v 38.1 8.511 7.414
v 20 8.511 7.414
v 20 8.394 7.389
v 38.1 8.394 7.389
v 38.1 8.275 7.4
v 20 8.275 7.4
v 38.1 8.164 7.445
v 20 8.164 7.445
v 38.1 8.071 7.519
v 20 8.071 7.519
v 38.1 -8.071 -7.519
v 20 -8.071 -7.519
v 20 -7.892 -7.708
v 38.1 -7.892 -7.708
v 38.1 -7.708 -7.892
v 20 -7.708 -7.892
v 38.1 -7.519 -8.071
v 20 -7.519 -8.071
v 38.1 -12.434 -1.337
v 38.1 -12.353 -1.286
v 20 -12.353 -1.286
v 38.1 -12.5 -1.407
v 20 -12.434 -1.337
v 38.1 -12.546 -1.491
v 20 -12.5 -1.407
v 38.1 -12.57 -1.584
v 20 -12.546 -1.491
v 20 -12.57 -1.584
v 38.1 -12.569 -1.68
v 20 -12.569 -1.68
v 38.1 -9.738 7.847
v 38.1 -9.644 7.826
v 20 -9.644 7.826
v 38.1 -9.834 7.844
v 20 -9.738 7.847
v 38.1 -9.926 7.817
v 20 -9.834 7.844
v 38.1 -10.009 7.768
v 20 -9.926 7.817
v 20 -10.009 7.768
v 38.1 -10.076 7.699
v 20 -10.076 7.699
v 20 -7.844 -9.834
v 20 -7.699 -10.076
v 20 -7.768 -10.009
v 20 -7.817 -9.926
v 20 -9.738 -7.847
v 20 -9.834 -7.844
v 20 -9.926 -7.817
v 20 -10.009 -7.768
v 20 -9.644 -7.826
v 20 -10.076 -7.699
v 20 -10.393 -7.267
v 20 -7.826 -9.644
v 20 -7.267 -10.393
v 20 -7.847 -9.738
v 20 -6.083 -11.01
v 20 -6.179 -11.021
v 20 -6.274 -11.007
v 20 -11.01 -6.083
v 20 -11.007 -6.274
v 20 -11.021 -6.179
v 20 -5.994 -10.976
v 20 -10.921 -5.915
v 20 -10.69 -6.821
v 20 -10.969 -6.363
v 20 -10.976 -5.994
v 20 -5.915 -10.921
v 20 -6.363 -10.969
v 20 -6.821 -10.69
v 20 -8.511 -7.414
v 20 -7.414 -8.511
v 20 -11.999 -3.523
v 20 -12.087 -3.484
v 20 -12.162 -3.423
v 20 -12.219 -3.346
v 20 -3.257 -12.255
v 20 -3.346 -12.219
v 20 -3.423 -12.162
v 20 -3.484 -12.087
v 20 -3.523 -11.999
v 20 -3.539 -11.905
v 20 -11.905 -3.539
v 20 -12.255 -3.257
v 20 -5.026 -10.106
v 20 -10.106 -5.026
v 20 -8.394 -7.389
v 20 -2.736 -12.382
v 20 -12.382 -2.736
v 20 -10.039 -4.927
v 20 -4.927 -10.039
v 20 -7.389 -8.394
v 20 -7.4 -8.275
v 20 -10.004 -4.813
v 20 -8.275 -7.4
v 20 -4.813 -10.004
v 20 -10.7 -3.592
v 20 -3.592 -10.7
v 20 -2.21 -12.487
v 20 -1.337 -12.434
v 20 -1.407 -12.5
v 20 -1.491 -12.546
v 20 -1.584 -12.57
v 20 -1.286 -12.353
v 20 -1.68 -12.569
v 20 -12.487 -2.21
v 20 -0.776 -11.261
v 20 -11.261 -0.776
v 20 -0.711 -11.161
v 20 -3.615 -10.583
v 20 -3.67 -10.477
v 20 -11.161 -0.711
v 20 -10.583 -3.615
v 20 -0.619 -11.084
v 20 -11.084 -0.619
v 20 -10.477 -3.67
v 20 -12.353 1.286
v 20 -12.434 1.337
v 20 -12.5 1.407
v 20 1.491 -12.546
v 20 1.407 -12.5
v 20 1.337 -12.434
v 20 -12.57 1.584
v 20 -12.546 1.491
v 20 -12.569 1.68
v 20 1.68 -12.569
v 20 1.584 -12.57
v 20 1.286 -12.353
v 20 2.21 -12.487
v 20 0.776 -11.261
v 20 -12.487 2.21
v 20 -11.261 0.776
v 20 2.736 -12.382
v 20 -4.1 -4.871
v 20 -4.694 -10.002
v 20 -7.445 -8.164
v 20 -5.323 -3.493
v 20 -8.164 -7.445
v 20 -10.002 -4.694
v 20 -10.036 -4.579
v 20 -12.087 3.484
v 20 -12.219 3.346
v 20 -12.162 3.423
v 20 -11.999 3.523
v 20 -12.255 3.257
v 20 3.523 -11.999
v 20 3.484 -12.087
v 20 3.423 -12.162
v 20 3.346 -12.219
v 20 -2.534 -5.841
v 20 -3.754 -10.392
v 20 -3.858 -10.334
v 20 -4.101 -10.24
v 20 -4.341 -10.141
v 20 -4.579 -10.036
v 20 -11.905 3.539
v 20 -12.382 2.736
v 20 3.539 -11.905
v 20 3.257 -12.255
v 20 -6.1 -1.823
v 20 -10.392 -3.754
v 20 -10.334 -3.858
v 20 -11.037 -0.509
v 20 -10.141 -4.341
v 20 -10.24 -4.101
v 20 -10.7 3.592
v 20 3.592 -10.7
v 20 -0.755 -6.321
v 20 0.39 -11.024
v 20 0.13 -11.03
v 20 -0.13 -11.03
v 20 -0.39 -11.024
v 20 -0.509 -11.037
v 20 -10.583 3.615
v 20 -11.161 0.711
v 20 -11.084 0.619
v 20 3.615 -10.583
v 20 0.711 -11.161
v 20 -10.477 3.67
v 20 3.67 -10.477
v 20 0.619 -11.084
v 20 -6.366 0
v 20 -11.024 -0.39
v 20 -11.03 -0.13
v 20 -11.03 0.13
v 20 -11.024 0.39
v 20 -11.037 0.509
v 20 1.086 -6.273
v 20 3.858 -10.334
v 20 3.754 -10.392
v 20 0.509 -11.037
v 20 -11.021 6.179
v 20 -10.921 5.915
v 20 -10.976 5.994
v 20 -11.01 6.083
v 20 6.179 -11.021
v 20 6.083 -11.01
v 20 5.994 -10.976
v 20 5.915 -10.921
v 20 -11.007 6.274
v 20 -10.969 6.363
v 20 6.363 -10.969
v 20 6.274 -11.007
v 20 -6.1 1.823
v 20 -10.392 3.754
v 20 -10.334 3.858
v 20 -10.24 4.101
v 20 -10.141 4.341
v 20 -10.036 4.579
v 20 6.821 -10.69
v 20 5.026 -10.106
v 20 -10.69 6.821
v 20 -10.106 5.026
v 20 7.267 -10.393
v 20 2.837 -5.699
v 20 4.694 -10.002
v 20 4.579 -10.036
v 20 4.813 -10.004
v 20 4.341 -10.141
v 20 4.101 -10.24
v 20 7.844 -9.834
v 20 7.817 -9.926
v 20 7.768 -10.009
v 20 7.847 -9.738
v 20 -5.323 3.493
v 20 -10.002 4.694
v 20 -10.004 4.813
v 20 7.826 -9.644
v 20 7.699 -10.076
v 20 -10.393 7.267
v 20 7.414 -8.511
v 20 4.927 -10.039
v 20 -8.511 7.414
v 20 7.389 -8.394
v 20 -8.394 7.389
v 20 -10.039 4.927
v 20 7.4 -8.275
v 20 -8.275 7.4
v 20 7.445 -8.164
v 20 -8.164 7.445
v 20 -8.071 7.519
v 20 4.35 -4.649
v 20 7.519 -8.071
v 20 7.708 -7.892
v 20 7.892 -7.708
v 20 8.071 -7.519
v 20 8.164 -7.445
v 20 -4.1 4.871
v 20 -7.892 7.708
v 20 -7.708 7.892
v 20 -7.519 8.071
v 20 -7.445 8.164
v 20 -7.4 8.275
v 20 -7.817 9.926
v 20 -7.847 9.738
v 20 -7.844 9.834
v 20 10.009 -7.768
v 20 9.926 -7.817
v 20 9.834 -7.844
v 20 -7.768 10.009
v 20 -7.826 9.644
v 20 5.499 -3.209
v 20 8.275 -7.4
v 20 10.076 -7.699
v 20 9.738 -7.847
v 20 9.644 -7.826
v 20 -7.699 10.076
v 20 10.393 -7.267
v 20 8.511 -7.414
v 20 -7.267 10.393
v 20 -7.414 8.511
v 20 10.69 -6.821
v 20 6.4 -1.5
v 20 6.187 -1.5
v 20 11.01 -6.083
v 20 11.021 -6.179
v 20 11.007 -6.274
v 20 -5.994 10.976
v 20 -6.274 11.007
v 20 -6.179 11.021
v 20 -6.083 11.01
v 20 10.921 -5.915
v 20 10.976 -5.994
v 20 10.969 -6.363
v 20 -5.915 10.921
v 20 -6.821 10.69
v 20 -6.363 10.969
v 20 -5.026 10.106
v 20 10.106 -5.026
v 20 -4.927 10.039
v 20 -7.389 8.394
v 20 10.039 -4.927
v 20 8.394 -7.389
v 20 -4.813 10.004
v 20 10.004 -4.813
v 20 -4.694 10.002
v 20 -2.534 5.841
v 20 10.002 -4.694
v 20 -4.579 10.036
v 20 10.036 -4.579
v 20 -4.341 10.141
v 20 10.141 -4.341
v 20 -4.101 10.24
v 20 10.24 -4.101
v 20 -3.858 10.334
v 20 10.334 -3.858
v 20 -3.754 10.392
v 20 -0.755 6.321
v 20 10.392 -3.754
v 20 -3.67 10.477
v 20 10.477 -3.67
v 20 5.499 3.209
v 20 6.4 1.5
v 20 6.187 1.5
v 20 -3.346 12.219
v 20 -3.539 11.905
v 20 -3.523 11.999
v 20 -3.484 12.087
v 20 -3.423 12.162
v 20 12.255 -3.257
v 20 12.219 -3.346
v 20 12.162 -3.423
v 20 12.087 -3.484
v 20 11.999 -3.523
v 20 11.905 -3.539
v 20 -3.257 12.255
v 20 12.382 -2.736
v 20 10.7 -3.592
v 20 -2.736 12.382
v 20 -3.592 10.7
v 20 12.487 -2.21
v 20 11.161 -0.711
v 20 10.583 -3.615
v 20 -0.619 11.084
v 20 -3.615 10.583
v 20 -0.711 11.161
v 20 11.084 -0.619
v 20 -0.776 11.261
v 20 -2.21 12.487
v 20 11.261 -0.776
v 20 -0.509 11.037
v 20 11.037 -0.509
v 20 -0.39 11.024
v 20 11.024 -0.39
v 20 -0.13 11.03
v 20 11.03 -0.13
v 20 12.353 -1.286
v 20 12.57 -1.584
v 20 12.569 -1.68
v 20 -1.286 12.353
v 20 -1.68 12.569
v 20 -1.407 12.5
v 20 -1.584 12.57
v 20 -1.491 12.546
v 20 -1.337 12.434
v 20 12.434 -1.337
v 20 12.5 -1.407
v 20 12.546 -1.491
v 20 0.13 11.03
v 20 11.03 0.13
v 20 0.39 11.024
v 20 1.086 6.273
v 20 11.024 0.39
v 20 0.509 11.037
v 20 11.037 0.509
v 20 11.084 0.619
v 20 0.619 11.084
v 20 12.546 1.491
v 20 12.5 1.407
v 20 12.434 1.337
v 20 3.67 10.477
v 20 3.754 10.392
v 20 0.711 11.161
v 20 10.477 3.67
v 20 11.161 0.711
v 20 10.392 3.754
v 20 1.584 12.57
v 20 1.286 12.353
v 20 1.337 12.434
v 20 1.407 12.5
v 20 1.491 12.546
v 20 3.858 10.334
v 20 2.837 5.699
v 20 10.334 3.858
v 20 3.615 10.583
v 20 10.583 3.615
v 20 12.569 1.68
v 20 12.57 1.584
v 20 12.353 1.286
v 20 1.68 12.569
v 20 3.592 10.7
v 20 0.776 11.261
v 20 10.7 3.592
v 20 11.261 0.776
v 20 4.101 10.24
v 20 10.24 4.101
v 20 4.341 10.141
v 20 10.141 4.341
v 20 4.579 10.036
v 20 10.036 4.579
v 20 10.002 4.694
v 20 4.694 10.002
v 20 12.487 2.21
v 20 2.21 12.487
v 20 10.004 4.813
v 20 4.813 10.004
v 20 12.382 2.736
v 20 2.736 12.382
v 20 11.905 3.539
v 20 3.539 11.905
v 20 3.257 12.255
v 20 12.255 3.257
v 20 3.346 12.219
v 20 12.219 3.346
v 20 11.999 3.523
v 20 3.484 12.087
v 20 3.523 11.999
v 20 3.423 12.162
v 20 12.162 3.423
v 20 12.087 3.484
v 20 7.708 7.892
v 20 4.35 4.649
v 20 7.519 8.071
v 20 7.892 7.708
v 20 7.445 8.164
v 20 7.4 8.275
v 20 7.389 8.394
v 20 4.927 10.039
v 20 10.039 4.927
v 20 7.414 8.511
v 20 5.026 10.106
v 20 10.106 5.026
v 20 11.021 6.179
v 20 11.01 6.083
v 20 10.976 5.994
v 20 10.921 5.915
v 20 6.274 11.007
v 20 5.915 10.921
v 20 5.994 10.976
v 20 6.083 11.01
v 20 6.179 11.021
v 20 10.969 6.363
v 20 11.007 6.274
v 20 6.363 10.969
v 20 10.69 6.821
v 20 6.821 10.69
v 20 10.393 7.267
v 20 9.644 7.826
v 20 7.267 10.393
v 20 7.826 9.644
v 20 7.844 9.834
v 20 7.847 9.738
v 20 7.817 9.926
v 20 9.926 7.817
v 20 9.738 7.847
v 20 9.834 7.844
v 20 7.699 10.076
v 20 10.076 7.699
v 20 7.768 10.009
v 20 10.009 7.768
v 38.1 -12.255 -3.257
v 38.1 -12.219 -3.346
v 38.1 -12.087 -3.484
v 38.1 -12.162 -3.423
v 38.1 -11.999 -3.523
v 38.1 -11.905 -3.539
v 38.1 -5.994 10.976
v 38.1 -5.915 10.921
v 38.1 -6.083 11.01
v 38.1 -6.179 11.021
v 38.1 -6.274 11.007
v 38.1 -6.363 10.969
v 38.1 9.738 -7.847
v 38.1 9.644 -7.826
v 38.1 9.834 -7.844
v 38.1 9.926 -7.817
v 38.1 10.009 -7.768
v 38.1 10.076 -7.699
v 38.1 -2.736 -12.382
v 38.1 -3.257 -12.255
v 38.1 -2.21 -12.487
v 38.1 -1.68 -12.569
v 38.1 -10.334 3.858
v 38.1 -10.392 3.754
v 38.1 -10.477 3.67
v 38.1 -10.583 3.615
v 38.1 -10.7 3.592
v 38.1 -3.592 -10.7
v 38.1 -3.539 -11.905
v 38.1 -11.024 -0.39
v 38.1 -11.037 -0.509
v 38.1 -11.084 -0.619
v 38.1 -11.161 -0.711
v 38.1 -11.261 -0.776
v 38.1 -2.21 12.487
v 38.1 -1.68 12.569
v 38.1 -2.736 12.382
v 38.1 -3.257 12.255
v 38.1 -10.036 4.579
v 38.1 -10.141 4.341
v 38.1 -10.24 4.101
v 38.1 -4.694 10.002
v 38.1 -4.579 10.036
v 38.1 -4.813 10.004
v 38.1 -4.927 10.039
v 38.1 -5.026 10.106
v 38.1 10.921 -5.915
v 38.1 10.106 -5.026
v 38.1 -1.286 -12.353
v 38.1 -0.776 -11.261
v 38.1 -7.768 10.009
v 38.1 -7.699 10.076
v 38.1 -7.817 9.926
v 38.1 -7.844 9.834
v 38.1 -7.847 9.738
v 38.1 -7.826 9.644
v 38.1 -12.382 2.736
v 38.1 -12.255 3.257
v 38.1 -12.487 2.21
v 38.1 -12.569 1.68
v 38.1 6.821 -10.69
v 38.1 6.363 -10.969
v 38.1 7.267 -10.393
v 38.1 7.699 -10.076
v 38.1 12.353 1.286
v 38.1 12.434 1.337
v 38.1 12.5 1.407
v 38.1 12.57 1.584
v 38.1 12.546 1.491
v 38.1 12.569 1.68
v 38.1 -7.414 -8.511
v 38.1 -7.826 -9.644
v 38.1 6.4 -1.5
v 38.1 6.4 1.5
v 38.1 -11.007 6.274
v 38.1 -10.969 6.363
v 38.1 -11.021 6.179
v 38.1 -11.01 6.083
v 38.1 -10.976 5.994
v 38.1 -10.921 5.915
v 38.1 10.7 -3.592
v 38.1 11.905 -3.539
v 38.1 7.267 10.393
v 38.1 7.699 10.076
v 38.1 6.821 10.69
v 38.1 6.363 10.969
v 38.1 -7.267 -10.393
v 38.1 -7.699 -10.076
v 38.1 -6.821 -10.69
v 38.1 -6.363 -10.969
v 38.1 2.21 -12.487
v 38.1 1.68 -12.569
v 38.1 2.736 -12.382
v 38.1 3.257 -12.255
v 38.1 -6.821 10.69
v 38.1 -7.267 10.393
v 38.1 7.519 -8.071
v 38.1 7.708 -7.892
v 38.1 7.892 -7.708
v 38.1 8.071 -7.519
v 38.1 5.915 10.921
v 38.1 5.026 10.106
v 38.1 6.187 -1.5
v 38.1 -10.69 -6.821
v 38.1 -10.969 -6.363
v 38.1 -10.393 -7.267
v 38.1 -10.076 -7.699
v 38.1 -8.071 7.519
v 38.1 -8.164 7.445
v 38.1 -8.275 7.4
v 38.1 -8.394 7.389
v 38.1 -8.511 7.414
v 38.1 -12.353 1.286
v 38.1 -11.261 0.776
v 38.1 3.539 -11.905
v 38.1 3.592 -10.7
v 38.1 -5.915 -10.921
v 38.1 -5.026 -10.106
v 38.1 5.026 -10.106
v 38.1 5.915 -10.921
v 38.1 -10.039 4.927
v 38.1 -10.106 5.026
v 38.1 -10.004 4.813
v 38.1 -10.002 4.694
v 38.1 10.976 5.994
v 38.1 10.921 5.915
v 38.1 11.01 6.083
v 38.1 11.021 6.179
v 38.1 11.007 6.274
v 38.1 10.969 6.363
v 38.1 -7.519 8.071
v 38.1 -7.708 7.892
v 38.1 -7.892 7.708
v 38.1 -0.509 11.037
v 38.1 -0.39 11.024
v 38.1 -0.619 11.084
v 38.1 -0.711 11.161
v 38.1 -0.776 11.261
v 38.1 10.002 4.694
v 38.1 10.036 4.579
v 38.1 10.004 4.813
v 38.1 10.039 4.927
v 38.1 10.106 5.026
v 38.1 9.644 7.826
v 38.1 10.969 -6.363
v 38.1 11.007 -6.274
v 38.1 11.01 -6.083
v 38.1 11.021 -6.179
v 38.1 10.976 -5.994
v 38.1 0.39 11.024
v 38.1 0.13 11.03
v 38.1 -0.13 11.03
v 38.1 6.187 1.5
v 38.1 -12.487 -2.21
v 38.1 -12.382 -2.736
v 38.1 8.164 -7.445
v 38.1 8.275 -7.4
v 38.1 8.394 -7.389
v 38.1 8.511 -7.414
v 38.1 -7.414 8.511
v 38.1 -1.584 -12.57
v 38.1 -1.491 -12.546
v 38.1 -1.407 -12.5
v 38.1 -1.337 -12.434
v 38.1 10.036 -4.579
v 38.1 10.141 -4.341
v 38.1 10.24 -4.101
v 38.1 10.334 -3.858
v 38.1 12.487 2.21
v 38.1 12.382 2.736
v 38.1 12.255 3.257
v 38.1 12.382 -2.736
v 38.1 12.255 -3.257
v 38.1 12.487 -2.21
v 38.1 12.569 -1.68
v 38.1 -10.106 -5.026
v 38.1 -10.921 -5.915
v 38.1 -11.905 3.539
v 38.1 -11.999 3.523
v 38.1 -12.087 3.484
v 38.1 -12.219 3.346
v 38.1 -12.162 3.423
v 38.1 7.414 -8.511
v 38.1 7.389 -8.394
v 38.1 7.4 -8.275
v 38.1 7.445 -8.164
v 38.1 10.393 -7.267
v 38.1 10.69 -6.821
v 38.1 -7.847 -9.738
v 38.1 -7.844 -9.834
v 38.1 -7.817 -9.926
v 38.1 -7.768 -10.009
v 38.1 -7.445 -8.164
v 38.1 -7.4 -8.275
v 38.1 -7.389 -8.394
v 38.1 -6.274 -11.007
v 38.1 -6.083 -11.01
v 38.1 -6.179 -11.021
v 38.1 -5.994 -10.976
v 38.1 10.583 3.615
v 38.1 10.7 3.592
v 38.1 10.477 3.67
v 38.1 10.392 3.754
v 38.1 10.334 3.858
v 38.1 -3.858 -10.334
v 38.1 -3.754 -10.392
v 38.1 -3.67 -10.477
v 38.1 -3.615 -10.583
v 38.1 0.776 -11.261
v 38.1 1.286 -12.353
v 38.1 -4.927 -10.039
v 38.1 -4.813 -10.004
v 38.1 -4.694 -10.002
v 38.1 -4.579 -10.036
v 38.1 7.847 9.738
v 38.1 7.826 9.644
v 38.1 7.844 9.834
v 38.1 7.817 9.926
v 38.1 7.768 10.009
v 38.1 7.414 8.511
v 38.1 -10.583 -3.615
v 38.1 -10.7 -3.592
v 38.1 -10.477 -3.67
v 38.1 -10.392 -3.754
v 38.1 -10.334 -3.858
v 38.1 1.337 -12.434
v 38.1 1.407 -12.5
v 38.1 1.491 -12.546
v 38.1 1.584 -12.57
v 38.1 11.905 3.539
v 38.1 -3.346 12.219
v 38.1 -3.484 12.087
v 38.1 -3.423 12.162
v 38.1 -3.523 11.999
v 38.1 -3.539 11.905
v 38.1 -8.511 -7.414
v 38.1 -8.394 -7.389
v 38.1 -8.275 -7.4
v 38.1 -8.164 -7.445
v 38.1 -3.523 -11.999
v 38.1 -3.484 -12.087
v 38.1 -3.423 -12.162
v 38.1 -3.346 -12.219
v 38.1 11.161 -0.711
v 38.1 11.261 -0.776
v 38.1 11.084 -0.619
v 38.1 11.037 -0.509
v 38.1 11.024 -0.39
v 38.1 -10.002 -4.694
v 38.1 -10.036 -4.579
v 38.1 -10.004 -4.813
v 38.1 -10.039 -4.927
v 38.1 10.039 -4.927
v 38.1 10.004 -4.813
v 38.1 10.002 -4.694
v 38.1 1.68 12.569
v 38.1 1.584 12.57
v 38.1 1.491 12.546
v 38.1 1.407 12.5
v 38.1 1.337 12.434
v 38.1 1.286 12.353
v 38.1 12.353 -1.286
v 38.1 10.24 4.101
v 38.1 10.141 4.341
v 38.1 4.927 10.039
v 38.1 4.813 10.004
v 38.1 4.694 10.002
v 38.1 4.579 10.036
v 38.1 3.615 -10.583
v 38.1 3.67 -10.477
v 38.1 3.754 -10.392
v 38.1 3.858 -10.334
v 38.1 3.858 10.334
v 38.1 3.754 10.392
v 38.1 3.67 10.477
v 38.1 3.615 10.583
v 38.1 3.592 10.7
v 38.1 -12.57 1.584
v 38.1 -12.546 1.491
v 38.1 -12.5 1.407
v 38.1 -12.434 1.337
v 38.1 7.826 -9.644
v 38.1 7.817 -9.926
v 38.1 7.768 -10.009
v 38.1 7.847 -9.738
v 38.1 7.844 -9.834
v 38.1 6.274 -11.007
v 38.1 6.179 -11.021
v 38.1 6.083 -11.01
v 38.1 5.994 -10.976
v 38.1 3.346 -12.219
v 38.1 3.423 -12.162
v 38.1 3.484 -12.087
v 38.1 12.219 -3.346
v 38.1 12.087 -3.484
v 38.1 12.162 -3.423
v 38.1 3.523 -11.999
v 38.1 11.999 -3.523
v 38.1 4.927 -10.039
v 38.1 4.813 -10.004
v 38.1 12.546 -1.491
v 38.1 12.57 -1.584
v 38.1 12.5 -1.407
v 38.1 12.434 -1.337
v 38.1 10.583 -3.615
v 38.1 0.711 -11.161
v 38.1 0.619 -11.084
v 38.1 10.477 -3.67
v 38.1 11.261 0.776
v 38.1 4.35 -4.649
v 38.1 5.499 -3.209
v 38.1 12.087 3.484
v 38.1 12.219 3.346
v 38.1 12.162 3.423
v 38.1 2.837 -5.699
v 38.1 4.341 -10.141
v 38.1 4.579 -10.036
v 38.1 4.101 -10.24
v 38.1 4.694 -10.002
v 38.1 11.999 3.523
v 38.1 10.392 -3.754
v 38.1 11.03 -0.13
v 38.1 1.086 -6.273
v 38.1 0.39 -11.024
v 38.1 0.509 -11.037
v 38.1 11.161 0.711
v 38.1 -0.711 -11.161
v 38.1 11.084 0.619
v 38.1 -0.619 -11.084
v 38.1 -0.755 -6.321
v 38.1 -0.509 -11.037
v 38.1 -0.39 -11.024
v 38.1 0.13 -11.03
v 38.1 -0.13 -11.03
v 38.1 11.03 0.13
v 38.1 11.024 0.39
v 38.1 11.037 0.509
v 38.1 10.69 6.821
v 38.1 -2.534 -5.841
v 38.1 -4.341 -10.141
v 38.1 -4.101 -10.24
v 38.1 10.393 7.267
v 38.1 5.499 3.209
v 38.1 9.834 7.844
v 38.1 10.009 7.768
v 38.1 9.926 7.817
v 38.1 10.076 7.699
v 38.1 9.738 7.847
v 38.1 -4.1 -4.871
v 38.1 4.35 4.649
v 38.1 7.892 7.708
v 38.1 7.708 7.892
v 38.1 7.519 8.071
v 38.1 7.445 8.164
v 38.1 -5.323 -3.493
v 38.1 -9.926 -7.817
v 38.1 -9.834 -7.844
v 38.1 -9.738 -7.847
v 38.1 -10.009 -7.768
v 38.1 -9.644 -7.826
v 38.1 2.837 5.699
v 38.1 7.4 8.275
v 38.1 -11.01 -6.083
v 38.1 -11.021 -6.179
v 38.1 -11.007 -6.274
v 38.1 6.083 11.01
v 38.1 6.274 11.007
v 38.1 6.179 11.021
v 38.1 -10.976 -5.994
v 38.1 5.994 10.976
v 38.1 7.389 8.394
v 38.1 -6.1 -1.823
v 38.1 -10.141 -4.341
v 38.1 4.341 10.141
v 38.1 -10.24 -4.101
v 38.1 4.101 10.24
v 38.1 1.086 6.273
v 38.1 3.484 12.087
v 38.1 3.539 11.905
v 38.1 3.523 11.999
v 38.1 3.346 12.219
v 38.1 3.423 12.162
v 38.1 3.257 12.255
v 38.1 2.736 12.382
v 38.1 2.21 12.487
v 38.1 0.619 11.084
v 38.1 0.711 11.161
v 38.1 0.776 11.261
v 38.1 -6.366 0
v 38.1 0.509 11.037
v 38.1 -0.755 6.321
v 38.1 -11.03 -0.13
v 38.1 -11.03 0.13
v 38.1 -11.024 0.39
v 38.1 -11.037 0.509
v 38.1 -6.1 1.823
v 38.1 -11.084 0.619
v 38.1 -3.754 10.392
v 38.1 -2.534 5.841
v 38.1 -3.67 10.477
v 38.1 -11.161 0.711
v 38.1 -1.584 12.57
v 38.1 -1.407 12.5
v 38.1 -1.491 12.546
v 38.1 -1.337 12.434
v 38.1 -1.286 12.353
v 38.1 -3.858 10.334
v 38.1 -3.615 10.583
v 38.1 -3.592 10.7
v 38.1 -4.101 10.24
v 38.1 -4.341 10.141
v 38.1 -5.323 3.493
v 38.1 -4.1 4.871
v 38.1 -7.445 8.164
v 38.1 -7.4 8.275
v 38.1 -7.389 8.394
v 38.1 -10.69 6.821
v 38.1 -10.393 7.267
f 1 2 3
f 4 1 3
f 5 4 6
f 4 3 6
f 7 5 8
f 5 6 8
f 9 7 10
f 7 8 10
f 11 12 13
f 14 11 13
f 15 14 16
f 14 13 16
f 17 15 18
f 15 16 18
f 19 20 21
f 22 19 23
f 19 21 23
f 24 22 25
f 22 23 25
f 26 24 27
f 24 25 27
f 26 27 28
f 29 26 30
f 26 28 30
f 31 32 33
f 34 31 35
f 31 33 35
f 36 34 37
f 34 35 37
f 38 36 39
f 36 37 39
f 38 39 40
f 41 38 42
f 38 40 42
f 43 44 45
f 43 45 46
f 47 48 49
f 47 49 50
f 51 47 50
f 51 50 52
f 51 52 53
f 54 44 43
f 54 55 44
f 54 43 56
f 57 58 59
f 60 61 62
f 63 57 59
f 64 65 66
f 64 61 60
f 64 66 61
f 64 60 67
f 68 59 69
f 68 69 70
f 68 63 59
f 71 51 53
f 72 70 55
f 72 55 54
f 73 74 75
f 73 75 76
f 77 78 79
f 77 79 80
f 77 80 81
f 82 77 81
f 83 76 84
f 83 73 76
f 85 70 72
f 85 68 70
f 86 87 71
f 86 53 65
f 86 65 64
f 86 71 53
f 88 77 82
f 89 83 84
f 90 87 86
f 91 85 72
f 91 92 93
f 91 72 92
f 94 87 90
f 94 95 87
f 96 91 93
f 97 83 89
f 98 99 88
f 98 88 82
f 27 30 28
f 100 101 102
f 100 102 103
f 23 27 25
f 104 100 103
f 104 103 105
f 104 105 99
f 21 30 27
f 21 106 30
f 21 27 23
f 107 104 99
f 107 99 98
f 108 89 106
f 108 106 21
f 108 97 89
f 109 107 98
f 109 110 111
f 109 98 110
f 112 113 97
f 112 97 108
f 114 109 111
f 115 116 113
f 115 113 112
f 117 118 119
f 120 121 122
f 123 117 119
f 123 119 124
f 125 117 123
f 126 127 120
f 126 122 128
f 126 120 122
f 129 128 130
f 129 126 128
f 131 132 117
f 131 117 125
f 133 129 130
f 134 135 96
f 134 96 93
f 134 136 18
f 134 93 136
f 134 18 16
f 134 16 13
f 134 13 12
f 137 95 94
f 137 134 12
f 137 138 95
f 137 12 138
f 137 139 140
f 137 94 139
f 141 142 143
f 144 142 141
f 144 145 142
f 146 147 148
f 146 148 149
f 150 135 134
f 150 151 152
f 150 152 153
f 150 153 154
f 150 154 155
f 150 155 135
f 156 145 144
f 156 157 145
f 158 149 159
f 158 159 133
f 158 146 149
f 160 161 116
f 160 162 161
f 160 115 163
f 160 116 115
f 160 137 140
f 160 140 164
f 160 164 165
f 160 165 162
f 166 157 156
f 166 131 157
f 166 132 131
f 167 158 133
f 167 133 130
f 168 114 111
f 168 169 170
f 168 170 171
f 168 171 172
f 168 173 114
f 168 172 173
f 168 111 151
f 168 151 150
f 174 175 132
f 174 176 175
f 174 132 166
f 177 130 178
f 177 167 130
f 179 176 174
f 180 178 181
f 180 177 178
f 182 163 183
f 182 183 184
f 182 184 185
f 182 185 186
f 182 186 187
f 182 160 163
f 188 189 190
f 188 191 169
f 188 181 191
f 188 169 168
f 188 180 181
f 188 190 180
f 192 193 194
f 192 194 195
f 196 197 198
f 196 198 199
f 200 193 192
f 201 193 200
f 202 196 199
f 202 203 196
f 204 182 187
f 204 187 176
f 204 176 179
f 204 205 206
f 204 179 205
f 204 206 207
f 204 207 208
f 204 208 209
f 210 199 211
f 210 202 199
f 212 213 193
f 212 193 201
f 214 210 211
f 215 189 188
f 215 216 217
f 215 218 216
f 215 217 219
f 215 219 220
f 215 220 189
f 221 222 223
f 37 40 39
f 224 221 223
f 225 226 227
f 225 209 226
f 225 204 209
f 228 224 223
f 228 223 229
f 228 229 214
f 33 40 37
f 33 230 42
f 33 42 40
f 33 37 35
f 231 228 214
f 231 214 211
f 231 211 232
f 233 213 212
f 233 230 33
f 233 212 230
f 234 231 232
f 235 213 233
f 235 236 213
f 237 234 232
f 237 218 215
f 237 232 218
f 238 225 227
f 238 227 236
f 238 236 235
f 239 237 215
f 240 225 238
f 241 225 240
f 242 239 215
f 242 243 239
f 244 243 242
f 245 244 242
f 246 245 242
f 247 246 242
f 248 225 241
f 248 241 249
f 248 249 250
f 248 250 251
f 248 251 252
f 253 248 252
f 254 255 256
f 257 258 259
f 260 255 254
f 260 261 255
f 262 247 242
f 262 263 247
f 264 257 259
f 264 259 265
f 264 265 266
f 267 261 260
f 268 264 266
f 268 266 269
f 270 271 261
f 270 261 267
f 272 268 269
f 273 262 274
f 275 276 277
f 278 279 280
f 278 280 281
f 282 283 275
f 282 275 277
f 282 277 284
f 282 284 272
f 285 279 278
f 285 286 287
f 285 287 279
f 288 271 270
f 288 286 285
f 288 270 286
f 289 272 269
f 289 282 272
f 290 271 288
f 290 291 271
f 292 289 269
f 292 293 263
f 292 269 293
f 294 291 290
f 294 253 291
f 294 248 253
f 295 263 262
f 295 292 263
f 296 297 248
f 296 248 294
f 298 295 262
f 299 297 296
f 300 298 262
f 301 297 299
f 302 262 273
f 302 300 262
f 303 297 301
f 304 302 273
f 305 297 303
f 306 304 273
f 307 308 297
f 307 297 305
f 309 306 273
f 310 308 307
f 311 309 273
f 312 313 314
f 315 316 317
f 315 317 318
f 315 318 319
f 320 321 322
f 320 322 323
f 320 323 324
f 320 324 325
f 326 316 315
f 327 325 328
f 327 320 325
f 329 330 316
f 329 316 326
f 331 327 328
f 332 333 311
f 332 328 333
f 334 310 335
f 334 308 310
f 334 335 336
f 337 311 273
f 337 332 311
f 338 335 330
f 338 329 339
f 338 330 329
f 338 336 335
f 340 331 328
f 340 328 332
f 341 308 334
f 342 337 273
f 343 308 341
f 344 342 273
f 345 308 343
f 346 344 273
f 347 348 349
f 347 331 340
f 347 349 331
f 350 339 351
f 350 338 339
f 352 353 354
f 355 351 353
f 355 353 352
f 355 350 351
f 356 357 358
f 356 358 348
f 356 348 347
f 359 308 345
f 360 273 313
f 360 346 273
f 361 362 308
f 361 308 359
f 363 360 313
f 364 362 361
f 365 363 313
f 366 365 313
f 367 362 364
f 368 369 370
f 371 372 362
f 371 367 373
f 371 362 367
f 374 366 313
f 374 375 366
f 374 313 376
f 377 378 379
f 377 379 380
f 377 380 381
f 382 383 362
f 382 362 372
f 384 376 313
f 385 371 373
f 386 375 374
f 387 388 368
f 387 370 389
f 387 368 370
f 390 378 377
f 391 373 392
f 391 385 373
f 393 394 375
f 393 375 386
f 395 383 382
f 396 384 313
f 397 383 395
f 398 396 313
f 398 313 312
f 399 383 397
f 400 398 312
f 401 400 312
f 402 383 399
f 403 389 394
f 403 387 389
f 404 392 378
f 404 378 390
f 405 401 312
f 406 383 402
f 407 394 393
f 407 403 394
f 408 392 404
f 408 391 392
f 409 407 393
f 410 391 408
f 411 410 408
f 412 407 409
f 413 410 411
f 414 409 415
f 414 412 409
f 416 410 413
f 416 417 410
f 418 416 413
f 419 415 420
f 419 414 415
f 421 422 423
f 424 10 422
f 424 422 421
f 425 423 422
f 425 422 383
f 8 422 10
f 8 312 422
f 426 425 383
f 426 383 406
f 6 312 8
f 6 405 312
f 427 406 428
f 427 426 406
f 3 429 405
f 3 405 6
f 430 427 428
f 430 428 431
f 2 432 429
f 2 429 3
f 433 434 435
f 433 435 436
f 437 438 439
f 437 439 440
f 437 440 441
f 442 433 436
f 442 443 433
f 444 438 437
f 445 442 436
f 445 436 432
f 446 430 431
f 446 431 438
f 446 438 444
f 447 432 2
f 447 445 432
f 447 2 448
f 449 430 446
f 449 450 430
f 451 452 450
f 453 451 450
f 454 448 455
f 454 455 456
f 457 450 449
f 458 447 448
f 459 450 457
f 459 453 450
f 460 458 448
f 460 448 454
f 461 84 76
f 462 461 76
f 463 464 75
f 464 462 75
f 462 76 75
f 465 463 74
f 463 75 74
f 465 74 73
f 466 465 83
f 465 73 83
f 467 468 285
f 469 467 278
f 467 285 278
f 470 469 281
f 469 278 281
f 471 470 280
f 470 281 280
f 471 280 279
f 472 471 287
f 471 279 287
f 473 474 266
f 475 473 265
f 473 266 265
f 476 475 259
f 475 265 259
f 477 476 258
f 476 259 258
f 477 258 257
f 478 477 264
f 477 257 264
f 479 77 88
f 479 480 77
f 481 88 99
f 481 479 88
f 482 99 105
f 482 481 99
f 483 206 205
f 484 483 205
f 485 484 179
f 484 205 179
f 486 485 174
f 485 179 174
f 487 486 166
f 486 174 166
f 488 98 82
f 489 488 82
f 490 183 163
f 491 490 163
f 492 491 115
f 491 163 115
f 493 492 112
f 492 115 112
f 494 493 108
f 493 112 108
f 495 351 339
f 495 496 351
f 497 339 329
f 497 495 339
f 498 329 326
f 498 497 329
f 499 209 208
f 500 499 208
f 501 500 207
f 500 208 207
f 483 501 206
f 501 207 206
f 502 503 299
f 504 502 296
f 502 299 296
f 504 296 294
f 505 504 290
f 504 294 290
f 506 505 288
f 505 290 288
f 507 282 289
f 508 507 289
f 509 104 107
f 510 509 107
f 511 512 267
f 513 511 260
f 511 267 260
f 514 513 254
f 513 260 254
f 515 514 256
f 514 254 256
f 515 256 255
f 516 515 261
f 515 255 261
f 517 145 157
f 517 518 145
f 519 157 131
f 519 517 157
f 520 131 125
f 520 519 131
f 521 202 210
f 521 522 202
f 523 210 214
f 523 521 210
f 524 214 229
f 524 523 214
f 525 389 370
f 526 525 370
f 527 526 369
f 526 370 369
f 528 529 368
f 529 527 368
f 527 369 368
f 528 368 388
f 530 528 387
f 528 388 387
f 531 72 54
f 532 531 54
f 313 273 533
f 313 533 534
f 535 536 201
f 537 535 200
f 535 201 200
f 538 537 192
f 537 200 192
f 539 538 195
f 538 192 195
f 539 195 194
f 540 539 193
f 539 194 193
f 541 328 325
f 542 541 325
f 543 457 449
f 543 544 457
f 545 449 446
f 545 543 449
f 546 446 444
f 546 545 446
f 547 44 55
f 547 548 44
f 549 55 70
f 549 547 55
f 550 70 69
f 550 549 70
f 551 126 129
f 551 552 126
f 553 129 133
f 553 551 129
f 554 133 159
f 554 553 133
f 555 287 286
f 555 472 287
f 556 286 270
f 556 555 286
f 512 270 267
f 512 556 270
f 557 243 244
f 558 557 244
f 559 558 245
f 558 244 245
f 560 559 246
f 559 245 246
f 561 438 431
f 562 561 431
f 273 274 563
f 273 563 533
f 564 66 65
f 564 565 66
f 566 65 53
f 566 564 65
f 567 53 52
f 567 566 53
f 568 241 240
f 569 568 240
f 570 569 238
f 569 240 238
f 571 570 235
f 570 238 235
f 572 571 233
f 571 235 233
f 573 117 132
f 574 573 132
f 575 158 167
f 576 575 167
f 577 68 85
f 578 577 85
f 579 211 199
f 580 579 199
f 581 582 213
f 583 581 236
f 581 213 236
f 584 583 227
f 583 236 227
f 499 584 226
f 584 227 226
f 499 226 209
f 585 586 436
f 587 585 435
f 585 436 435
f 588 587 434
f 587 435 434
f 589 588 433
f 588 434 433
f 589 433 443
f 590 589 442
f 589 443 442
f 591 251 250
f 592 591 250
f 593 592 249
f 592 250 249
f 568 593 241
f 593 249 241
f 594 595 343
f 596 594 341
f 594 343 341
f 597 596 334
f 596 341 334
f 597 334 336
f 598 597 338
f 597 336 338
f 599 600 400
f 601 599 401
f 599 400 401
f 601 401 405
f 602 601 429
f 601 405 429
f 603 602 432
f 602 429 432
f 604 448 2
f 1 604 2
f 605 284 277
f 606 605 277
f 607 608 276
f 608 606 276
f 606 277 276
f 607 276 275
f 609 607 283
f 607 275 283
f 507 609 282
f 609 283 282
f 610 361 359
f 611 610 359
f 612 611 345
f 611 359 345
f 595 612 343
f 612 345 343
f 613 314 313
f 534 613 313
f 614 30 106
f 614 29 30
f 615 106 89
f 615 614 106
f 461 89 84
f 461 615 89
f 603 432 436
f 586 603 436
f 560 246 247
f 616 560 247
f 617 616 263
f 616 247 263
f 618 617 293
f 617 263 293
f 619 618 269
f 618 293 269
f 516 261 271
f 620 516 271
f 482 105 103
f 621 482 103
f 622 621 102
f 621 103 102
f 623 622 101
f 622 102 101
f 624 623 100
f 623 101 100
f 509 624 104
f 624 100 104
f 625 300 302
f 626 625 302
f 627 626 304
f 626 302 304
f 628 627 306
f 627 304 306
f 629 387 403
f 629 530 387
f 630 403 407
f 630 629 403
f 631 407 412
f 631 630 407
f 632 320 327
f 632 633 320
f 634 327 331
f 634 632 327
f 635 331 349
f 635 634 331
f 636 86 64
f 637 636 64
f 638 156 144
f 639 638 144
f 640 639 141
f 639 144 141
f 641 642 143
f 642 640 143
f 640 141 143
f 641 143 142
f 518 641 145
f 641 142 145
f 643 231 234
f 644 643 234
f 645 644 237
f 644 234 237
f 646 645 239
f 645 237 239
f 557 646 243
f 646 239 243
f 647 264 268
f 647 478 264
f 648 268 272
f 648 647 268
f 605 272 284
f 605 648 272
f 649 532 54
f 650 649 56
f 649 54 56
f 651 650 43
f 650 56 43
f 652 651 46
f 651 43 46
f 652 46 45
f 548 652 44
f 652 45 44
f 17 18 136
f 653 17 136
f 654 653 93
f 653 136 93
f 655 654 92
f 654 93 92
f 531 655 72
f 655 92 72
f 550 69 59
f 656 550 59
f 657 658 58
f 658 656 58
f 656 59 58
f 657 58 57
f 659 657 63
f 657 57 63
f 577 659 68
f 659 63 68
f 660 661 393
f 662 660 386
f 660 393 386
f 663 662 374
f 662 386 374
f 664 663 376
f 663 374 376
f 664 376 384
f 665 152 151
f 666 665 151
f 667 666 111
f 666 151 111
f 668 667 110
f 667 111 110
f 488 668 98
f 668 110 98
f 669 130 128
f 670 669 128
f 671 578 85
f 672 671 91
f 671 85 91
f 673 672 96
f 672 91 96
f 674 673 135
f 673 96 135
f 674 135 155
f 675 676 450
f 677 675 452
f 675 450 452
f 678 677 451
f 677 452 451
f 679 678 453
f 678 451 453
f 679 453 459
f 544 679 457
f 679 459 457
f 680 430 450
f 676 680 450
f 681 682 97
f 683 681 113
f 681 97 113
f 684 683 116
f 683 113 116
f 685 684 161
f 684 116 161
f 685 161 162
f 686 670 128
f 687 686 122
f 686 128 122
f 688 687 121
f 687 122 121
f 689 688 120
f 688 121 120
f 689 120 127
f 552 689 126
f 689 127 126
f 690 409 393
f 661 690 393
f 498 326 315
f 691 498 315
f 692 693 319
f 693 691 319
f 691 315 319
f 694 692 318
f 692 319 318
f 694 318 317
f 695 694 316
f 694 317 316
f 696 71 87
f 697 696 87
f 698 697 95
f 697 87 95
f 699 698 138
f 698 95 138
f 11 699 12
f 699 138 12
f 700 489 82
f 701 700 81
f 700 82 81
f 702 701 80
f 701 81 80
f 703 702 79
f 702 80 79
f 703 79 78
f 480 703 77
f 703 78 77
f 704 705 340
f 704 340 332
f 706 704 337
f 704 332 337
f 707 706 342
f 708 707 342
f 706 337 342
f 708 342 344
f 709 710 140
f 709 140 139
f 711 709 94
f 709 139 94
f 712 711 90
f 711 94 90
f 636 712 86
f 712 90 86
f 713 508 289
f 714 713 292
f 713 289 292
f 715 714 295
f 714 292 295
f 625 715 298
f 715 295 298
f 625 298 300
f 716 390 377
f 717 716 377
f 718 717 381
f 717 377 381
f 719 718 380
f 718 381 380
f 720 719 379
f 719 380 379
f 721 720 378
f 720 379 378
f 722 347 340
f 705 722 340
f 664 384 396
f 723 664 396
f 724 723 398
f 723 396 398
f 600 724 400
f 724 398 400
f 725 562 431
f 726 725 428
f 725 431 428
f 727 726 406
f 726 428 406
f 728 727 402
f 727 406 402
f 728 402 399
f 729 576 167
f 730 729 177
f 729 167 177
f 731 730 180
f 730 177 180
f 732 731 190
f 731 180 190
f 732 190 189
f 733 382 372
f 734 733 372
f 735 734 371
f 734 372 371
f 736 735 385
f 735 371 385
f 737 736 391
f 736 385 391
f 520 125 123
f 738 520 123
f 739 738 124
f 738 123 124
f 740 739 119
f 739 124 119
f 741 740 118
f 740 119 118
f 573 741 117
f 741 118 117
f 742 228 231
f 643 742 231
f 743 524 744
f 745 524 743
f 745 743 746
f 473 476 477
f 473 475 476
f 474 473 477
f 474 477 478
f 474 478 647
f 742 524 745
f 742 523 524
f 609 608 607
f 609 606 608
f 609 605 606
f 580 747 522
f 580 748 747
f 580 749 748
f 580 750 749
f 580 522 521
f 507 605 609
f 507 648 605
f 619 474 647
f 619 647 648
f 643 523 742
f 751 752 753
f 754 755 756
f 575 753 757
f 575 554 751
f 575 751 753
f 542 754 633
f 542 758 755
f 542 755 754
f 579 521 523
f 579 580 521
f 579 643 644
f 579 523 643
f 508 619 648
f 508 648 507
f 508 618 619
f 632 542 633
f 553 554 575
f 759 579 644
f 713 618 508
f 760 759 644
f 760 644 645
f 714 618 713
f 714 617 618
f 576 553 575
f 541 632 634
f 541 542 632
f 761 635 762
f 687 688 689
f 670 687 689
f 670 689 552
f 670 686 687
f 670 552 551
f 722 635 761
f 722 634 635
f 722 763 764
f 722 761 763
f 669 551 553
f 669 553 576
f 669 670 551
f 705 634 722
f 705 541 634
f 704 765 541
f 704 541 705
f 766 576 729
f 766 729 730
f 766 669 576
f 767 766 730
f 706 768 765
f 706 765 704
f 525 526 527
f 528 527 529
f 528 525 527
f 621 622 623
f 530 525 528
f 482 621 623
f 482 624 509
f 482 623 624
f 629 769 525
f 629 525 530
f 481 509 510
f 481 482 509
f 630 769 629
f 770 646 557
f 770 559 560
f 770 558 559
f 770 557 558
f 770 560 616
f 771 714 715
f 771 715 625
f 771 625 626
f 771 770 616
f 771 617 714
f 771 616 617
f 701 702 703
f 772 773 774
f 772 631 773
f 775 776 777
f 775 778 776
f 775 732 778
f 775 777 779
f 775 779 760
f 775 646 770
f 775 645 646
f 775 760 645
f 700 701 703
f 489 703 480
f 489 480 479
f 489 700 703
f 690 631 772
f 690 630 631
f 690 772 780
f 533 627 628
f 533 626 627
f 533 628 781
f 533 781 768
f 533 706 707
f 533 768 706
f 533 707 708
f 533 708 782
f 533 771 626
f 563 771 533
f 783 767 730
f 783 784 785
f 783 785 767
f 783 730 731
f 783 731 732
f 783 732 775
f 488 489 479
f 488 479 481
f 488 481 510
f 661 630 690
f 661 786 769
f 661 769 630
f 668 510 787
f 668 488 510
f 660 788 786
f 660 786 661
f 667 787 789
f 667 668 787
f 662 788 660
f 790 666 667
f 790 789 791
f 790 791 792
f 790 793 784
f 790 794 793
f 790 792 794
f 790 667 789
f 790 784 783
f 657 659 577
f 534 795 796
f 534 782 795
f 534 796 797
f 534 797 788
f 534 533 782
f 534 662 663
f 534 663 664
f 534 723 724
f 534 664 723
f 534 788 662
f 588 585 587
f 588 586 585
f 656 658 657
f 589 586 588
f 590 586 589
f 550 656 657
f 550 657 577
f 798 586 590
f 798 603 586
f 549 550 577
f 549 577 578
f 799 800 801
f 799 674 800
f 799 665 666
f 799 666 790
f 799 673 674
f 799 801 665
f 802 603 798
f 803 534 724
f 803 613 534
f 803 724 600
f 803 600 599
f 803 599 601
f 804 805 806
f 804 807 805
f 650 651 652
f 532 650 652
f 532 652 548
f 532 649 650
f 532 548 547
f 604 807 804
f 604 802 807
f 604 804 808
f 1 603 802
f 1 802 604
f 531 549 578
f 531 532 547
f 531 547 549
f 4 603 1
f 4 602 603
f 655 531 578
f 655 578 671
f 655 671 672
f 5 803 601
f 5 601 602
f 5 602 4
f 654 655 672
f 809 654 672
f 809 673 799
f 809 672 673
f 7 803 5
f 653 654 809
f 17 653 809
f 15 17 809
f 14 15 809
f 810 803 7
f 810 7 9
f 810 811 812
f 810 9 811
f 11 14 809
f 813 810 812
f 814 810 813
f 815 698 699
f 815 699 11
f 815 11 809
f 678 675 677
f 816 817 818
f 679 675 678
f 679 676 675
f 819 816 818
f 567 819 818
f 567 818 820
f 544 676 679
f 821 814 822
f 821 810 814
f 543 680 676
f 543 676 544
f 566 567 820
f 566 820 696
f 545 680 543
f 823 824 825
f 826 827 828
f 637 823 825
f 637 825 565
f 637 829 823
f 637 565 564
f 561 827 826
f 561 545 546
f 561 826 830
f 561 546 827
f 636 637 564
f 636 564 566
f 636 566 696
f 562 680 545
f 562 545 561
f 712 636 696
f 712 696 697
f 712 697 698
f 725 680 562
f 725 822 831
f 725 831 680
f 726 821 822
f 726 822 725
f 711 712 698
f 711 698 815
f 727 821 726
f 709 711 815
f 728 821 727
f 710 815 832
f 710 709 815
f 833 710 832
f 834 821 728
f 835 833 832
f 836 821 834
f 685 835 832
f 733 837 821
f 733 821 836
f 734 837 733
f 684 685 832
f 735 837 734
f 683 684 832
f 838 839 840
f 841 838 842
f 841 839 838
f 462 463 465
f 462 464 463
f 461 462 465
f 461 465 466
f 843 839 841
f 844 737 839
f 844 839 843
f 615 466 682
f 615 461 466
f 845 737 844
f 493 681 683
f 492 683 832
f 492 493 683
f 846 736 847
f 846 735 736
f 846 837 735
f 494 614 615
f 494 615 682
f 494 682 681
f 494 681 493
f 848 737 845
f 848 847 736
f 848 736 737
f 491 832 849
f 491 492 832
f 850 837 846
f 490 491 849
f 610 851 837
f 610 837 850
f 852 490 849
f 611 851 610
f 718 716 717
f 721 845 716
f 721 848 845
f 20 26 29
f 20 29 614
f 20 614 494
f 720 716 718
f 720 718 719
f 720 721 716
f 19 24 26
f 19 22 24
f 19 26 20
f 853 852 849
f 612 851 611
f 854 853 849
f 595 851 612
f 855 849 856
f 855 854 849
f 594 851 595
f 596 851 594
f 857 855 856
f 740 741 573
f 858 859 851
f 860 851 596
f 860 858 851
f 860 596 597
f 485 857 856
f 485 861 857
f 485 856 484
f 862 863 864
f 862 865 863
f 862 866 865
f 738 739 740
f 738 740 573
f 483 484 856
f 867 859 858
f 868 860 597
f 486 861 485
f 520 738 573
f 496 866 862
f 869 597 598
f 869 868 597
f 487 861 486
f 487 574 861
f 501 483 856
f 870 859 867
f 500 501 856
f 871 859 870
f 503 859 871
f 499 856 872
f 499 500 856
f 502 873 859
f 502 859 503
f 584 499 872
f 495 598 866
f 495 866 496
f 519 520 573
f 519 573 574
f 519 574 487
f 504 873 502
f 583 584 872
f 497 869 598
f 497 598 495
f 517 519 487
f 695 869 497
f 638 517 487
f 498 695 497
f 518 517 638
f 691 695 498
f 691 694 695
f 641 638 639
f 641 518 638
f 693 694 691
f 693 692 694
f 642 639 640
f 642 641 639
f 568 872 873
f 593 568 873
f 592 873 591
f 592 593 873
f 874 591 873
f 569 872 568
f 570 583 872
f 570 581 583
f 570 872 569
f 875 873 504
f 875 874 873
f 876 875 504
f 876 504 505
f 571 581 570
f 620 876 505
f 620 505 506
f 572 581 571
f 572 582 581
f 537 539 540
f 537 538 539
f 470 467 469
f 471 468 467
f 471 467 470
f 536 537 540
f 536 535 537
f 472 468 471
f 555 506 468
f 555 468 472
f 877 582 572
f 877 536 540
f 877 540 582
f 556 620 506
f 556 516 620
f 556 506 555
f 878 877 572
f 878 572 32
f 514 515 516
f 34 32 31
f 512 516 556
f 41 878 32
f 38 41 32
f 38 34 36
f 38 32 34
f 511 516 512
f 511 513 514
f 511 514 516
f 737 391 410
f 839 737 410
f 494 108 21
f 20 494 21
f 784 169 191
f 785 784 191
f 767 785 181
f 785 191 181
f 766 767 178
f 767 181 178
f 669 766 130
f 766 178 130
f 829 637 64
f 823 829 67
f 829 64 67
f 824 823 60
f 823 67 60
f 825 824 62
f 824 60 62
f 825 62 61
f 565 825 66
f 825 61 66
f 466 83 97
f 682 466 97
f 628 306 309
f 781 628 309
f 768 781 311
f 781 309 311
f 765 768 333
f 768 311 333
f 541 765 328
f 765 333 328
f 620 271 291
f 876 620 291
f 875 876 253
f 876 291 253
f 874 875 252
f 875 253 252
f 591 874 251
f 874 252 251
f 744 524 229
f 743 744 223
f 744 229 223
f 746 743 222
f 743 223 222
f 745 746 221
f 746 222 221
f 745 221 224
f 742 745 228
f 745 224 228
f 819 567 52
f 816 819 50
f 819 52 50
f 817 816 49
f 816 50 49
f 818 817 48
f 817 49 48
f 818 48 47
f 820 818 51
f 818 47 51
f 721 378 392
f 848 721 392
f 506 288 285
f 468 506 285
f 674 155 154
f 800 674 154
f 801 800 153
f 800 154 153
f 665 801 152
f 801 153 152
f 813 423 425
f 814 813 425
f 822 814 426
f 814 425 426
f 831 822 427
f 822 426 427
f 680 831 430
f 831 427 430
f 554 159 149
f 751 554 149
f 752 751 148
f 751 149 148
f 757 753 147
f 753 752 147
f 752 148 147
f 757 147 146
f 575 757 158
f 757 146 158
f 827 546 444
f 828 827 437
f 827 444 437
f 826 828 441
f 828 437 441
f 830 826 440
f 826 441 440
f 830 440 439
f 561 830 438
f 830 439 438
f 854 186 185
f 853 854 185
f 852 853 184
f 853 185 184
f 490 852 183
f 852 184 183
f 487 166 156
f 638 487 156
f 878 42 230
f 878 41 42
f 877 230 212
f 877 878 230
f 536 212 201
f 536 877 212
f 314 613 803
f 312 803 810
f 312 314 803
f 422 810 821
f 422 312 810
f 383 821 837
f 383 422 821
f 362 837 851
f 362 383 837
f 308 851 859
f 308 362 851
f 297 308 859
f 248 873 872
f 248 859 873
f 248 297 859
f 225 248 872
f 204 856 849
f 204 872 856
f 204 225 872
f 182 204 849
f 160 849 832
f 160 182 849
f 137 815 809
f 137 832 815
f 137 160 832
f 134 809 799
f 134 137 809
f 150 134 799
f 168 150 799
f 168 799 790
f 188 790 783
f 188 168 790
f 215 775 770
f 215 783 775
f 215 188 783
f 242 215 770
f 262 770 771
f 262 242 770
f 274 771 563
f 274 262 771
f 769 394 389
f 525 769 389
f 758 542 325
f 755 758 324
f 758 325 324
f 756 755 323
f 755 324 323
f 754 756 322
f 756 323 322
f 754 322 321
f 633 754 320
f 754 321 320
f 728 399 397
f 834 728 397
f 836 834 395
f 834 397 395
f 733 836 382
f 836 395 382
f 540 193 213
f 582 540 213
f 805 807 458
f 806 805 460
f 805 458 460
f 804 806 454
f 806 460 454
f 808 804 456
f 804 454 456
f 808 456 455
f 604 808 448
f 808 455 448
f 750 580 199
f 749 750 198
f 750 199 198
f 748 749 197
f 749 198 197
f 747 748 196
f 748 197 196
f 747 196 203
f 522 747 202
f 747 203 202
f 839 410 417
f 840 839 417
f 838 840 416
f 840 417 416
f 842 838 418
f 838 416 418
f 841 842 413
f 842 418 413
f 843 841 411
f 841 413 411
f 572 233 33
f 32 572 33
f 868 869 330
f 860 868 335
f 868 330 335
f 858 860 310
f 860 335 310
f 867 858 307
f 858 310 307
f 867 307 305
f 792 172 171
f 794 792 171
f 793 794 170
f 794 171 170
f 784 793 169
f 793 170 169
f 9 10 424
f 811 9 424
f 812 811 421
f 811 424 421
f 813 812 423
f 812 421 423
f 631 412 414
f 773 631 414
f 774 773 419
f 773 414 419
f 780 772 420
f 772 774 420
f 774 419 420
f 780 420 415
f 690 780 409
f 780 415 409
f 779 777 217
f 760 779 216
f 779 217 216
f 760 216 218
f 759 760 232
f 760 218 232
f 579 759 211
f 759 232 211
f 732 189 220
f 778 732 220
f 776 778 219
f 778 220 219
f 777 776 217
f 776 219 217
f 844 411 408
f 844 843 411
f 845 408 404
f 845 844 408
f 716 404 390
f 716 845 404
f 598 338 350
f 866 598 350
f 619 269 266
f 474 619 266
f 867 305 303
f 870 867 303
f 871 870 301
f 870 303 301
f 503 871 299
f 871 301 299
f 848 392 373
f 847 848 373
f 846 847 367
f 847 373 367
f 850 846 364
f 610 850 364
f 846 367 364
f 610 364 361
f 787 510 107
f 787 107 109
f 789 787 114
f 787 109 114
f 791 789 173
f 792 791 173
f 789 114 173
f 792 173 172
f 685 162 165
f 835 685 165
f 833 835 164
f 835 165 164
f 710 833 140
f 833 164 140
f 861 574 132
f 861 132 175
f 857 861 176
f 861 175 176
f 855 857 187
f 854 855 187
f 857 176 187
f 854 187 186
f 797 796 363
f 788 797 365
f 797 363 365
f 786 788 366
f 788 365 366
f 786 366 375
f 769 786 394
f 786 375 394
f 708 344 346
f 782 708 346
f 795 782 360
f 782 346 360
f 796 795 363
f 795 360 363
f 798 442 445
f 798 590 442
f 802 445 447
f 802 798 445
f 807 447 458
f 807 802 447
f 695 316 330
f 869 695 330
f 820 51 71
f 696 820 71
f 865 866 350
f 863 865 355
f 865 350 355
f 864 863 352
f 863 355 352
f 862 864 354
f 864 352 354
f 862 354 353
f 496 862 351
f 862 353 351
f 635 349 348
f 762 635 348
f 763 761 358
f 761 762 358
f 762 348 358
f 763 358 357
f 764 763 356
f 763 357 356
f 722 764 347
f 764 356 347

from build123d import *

# Parameters (mm, degrees)
CHAMFER_1_SIZE           = 1
SKETCH_4_W               = 3
SKETCH_4_H               = 1.630303969
CUT_EXTRUDE_1_DEPTH      = 43.109684421
CUT_EXTRUDE_2_REACH      = 44.11
PATTERN_CIRCULAR_3_COUNT = 16
SKETCH_7_R               = 23.358425388
CUT_EXTRUDE_3_DEPTH      = 20


with BuildPart() as part:
    # 草图1 → 旋转1 (revolve)
    with BuildSketch(Plane.XY):
        Polygon((0, 5), (0, 12.681), (38.1, 12.681), (38.1, 6.3664), (6.65, 6.3664), (6.65, 5), align=None)
    revolve(axis=Axis((0, 0, 0), (1, 0, 0)))

    # 倒角1
    chamfer_1_edges = [part.edges().sort_by_distance(p)[0] for p in [
        (6.65, -5, 0),
        (0, -5, 0),
    ]]
    chamfer(chamfer_1_edges, length=CHAMFER_1_SIZE)

    # 草图4 → 切除-拉伸1 (cut, through all)
    with BuildSketch(Plane.ZY):
        with Locations((0, 5.584847992)):
            Rectangle(SKETCH_4_W, SKETCH_4_H)
    extrude(amount=-CUT_EXTRUDE_1_DEPTH, mode=Mode.SUBTRACT)

    # 草图6 → 切除-拉伸2 (cut, up to next)
    with BuildSketch(Plane(origin=(0, 0, 0), x_dir=(0, 0, -1), z_dir=(1, 0, 0)), mode=Mode.PRIVATE) as cut_extrude_2_sk1:
        with BuildLine():
            Line((1.285723043, 12.353105336), (0.776264221, 11.260567368))
            ThreePointArc((0.776264221, 11.260567368), (0.618819992, 11.084207877), (0.390175975, 11.02409741))
            ThreePointArc((0.390175975, 11.02409741), (0, 11.031), (-0.390175975, 11.02409741))
            ThreePointArc((-0.390175975, 11.02409741), (-0.618819992, 11.084207877), (-0.776264221, 11.260567368))
            Line((-0.776264221, 11.260567368), (-1.285723043, 12.353105336))
            ThreePointArc((-1.285723043, 12.353105336), (-1.447679281, 12.525850138), (-1.680477339, 12.569158958))
            ThreePointArc((-1.680477339, 12.569158958), (-1.868612982, 12.542569375), (-2.056329114, 12.513163931))
            Line((-2.056329114, 12.513163931), (-2.671802841, 13.8330516))
            ThreePointArc((-2.671802841, 13.8330516), (0, 14.088713461), (2.671802841, 13.8330516))
            Line((2.671802841, 13.8330516), (2.056329114, 12.513163931))
            ThreePointArc((2.056329114, 12.513163931), (1.868612982, 12.542569375), (1.680477339, 12.569158958))
            ThreePointArc((1.680477339, 12.569158958), (1.447679281, 12.525850138), (1.285723043, 12.353105336))
        make_face()
    cut_extrude_2_tool1 = extrude(cut_extrude_2_sk1.sketch, amount=CUT_EXTRUDE_2_REACH, mode=Mode.PRIVATE) & part.part
    cut_extrude_2 = cut_extrude_2_tool1.solids().sort_by_distance((0, 12.873618, 0))[0]
    add(cut_extrude_2, mode=Mode.SUBTRACT)

    # 阵列(圆周)3: 切除-拉伸2 ×16 about axis
    pattern_circular_3_axis = Axis((-1.4, 0, 0), (1, 0, 0))
    for i in range(1, PATTERN_CIRCULAR_3_COUNT):
        add(cut_extrude_2.rotate(pattern_circular_3_axis, i * 360 / PATTERN_CIRCULAR_3_COUNT), mode=Mode.SUBTRACT)

    # 草图7 → 切除-拉伸3 (cut)
    with BuildSketch(Plane.ZY):
        Circle(SKETCH_7_R)
    extrude(amount=-CUT_EXTRUDE_3_DEPTH, mode=Mode.SUBTRACT)


solid = part.part
